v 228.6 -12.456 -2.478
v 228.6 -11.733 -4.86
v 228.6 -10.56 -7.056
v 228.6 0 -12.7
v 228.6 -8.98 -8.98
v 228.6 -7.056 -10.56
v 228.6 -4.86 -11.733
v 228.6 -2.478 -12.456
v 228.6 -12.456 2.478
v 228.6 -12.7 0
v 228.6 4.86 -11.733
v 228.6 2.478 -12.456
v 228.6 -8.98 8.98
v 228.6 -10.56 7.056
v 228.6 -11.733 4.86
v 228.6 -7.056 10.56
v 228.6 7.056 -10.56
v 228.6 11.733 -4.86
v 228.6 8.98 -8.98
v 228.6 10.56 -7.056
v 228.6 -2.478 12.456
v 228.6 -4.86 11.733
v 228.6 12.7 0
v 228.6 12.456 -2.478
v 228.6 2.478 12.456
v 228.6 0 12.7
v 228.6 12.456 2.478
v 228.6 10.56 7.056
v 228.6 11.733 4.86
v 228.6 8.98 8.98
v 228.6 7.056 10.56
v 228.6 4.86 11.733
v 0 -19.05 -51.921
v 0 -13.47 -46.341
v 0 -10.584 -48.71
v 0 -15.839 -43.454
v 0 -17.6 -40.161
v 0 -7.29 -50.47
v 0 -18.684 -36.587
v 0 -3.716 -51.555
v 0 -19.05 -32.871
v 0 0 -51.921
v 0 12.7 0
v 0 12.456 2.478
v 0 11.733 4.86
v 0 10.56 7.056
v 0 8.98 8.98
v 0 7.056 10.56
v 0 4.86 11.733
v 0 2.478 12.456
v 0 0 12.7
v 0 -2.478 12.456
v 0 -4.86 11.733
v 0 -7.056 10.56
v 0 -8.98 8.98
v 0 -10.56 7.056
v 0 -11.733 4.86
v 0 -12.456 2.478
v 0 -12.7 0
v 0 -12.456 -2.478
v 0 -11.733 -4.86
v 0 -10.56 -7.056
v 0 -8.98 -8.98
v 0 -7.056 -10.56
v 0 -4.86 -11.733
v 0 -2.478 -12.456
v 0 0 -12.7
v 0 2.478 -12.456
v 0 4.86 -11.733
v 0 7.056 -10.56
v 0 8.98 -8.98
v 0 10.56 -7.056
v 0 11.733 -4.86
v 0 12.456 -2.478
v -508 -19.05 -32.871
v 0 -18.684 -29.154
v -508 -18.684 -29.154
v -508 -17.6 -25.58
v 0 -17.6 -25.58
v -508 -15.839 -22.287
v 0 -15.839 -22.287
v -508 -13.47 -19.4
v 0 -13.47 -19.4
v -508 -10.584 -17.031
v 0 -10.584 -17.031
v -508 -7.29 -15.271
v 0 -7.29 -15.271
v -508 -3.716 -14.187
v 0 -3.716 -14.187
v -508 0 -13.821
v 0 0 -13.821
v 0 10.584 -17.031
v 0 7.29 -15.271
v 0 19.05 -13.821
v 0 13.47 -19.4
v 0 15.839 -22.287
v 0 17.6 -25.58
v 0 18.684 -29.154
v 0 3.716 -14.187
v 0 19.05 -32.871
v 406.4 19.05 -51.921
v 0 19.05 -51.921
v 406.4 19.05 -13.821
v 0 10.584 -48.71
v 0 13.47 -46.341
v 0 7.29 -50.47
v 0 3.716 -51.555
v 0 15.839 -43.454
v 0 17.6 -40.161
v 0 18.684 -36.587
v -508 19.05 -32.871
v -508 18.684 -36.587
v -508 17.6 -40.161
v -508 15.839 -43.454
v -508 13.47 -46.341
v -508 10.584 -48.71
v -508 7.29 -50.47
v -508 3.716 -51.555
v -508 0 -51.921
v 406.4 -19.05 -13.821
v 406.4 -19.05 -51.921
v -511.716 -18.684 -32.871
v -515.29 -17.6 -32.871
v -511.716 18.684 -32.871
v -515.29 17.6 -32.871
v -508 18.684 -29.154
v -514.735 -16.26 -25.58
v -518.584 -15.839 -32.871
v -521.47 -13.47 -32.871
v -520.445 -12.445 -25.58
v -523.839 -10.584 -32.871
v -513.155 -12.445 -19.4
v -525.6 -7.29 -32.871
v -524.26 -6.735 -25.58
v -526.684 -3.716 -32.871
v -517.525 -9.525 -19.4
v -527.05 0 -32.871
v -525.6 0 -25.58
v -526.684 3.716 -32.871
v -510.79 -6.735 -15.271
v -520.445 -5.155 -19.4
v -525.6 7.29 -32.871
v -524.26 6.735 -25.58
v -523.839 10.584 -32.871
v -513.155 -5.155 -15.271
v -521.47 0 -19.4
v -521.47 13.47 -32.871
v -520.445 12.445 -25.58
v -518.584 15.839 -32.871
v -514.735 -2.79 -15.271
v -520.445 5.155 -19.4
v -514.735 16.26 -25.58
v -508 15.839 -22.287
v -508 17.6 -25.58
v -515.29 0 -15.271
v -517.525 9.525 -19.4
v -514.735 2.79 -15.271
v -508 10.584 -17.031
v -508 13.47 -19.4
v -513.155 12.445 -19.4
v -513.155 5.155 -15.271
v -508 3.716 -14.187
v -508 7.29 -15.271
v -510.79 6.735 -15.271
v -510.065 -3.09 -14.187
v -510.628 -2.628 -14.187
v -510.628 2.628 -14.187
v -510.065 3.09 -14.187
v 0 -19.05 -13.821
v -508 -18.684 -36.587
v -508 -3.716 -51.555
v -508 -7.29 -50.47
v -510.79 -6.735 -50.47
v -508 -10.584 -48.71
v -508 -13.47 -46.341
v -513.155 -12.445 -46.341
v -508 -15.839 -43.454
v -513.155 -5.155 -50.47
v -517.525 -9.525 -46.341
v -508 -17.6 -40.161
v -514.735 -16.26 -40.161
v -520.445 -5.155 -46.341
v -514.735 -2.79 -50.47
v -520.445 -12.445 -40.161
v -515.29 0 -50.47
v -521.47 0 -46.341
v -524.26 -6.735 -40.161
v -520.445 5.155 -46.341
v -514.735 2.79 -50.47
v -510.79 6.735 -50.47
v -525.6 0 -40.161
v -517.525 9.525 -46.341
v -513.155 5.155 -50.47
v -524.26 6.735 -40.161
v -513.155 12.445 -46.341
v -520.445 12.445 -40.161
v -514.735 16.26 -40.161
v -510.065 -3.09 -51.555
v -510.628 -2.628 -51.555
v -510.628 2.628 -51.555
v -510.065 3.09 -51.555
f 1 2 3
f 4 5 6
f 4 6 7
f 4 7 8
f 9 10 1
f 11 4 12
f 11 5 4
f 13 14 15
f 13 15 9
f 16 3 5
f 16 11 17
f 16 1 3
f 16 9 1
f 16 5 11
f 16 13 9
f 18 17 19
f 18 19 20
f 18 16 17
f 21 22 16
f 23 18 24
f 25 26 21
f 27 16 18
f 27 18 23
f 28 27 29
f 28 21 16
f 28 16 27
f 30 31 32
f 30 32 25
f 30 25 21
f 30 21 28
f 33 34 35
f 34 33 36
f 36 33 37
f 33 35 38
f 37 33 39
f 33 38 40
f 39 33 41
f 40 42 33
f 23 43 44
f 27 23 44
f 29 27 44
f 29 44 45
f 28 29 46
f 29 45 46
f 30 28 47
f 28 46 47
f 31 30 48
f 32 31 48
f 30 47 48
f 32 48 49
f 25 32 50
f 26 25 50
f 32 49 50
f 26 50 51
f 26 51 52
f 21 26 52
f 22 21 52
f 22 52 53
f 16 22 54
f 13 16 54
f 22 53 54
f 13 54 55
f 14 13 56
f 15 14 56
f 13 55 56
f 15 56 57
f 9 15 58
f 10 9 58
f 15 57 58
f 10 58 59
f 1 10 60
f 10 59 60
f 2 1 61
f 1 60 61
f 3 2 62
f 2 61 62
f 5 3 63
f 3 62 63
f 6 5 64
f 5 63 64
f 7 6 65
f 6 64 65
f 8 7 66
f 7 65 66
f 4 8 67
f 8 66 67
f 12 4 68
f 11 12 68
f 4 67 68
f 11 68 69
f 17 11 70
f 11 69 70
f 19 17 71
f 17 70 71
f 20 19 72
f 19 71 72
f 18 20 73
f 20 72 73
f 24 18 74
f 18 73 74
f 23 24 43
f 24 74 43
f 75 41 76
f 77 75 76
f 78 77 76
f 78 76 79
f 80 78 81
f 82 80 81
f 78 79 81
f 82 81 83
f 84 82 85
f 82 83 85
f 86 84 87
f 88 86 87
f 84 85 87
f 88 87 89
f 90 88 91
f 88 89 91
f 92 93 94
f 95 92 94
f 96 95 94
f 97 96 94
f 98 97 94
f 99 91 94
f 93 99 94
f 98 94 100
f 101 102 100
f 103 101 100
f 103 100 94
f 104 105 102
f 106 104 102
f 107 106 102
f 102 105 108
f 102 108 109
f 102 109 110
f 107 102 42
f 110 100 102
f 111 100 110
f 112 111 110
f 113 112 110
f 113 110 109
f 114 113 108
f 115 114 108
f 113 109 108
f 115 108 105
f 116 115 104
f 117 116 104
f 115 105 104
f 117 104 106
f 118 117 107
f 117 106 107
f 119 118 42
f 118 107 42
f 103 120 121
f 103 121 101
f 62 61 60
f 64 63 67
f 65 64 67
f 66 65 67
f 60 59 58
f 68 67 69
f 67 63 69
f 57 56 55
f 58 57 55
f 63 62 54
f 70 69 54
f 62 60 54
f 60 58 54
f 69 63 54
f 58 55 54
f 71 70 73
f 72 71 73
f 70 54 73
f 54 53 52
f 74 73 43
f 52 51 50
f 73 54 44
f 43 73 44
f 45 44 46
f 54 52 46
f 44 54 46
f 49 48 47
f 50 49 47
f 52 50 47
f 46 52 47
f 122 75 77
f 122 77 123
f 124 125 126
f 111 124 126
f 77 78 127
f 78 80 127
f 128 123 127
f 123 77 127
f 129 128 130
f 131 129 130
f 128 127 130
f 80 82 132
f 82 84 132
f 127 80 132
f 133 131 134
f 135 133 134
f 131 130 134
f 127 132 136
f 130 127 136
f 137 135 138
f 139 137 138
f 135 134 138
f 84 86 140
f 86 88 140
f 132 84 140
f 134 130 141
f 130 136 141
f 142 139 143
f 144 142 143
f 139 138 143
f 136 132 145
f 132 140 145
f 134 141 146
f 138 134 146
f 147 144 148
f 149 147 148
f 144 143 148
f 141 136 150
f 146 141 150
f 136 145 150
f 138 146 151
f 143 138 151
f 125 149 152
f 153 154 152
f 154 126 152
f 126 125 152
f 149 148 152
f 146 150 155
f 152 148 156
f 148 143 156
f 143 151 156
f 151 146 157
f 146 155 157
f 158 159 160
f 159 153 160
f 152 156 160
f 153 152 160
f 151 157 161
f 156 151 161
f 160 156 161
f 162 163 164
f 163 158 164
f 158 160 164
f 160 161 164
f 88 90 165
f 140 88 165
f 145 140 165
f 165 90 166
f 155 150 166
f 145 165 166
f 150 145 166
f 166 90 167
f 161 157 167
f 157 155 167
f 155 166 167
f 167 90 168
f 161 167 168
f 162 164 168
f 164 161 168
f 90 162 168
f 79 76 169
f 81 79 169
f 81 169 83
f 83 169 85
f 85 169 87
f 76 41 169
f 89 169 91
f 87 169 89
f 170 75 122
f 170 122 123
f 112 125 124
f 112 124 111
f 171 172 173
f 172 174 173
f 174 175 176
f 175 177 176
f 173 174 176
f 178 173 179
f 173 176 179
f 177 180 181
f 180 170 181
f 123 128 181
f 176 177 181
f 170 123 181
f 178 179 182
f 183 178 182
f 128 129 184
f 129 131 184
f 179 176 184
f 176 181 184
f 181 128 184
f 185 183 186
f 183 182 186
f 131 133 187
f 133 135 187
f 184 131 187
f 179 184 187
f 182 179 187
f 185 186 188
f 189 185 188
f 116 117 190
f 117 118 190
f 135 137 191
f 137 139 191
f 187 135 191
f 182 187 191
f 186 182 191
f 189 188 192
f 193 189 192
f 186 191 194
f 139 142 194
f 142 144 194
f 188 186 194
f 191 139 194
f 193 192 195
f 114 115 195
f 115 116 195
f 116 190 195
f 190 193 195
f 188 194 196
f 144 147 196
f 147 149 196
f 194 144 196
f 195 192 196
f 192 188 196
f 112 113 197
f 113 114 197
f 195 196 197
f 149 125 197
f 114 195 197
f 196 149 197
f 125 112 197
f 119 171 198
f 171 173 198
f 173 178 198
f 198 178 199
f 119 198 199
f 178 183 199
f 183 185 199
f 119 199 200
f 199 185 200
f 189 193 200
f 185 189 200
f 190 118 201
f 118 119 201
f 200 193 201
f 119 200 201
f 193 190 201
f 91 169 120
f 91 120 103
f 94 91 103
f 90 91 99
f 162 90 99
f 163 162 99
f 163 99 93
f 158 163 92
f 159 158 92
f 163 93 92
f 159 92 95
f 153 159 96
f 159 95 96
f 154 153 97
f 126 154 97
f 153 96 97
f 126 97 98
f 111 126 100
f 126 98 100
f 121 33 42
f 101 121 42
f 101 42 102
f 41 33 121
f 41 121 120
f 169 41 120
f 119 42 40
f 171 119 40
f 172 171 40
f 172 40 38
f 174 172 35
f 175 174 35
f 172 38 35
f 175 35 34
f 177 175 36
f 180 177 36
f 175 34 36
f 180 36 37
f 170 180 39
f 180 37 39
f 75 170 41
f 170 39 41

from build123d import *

# Parameters (mm, degrees)
F0_R     = 12.7
F1_DEPTH = 228.6
F2_W     = 38.1
F2_H     = 38.1
F3_DEPTH = 406.4
F5_DEPTH = 508


with BuildPart() as f1:
    # F0 (on Right) → F1 (new body)
    with BuildSketch(Plane.YZ):
        Circle(F0_R)
    extrude(amount=F1_DEPTH)


with BuildPart() as f3:
    # F2 (on Right) → F3 (new body)
    with BuildSketch(Plane.YZ):
        with Locations((0, -32.870553)):
            Rectangle(F2_W, F2_H)
    extrude(amount=F3_DEPTH)

    # F4 (on face) → F5 (join)
    with BuildSketch(Plane(origin=(0, 0, 0), x_dir=(0, -1, 0), z_dir=(-1, 0, 0))):
        with BuildLine():
            ThreePointArc((0, -51.920553), (13.470384, -46.340938), (19.05, -32.870553))
            ThreePointArc((19.05, -32.870553), (13.470384, -19.400169), (0, -13.820553))
            ThreePointArc((0, -13.820553), (-13.470384, -19.400169), (-19.05, -32.870553))
            ThreePointArc((-19.05, -32.870553), (-13.470384, -46.340938), (0, -51.920553))
        make_face()
    extrude(amount=F5_DEPTH)

    # F6 (on face) → F7 (revolve)
    with BuildSketch(Plane(origin=(-508, 0, 0), x_dir=(0, -1, 0), z_dir=(-1, 0, 0))):
        with BuildLine():
            ThreePointArc((19.05, -32.870553), (13.470384, -19.400169), (0, -13.820553))
            Line((0, -13.820553), (0, -51.920553))
            ThreePointArc((0, -51.920553), (13.470384, -46.340938), (19.05, -32.870553))
        make_face()
    revolve(axis=Axis((-508, 0, -32.870553), (0, 0, -1)))


solid = Compound([f1.part, f3.part])
